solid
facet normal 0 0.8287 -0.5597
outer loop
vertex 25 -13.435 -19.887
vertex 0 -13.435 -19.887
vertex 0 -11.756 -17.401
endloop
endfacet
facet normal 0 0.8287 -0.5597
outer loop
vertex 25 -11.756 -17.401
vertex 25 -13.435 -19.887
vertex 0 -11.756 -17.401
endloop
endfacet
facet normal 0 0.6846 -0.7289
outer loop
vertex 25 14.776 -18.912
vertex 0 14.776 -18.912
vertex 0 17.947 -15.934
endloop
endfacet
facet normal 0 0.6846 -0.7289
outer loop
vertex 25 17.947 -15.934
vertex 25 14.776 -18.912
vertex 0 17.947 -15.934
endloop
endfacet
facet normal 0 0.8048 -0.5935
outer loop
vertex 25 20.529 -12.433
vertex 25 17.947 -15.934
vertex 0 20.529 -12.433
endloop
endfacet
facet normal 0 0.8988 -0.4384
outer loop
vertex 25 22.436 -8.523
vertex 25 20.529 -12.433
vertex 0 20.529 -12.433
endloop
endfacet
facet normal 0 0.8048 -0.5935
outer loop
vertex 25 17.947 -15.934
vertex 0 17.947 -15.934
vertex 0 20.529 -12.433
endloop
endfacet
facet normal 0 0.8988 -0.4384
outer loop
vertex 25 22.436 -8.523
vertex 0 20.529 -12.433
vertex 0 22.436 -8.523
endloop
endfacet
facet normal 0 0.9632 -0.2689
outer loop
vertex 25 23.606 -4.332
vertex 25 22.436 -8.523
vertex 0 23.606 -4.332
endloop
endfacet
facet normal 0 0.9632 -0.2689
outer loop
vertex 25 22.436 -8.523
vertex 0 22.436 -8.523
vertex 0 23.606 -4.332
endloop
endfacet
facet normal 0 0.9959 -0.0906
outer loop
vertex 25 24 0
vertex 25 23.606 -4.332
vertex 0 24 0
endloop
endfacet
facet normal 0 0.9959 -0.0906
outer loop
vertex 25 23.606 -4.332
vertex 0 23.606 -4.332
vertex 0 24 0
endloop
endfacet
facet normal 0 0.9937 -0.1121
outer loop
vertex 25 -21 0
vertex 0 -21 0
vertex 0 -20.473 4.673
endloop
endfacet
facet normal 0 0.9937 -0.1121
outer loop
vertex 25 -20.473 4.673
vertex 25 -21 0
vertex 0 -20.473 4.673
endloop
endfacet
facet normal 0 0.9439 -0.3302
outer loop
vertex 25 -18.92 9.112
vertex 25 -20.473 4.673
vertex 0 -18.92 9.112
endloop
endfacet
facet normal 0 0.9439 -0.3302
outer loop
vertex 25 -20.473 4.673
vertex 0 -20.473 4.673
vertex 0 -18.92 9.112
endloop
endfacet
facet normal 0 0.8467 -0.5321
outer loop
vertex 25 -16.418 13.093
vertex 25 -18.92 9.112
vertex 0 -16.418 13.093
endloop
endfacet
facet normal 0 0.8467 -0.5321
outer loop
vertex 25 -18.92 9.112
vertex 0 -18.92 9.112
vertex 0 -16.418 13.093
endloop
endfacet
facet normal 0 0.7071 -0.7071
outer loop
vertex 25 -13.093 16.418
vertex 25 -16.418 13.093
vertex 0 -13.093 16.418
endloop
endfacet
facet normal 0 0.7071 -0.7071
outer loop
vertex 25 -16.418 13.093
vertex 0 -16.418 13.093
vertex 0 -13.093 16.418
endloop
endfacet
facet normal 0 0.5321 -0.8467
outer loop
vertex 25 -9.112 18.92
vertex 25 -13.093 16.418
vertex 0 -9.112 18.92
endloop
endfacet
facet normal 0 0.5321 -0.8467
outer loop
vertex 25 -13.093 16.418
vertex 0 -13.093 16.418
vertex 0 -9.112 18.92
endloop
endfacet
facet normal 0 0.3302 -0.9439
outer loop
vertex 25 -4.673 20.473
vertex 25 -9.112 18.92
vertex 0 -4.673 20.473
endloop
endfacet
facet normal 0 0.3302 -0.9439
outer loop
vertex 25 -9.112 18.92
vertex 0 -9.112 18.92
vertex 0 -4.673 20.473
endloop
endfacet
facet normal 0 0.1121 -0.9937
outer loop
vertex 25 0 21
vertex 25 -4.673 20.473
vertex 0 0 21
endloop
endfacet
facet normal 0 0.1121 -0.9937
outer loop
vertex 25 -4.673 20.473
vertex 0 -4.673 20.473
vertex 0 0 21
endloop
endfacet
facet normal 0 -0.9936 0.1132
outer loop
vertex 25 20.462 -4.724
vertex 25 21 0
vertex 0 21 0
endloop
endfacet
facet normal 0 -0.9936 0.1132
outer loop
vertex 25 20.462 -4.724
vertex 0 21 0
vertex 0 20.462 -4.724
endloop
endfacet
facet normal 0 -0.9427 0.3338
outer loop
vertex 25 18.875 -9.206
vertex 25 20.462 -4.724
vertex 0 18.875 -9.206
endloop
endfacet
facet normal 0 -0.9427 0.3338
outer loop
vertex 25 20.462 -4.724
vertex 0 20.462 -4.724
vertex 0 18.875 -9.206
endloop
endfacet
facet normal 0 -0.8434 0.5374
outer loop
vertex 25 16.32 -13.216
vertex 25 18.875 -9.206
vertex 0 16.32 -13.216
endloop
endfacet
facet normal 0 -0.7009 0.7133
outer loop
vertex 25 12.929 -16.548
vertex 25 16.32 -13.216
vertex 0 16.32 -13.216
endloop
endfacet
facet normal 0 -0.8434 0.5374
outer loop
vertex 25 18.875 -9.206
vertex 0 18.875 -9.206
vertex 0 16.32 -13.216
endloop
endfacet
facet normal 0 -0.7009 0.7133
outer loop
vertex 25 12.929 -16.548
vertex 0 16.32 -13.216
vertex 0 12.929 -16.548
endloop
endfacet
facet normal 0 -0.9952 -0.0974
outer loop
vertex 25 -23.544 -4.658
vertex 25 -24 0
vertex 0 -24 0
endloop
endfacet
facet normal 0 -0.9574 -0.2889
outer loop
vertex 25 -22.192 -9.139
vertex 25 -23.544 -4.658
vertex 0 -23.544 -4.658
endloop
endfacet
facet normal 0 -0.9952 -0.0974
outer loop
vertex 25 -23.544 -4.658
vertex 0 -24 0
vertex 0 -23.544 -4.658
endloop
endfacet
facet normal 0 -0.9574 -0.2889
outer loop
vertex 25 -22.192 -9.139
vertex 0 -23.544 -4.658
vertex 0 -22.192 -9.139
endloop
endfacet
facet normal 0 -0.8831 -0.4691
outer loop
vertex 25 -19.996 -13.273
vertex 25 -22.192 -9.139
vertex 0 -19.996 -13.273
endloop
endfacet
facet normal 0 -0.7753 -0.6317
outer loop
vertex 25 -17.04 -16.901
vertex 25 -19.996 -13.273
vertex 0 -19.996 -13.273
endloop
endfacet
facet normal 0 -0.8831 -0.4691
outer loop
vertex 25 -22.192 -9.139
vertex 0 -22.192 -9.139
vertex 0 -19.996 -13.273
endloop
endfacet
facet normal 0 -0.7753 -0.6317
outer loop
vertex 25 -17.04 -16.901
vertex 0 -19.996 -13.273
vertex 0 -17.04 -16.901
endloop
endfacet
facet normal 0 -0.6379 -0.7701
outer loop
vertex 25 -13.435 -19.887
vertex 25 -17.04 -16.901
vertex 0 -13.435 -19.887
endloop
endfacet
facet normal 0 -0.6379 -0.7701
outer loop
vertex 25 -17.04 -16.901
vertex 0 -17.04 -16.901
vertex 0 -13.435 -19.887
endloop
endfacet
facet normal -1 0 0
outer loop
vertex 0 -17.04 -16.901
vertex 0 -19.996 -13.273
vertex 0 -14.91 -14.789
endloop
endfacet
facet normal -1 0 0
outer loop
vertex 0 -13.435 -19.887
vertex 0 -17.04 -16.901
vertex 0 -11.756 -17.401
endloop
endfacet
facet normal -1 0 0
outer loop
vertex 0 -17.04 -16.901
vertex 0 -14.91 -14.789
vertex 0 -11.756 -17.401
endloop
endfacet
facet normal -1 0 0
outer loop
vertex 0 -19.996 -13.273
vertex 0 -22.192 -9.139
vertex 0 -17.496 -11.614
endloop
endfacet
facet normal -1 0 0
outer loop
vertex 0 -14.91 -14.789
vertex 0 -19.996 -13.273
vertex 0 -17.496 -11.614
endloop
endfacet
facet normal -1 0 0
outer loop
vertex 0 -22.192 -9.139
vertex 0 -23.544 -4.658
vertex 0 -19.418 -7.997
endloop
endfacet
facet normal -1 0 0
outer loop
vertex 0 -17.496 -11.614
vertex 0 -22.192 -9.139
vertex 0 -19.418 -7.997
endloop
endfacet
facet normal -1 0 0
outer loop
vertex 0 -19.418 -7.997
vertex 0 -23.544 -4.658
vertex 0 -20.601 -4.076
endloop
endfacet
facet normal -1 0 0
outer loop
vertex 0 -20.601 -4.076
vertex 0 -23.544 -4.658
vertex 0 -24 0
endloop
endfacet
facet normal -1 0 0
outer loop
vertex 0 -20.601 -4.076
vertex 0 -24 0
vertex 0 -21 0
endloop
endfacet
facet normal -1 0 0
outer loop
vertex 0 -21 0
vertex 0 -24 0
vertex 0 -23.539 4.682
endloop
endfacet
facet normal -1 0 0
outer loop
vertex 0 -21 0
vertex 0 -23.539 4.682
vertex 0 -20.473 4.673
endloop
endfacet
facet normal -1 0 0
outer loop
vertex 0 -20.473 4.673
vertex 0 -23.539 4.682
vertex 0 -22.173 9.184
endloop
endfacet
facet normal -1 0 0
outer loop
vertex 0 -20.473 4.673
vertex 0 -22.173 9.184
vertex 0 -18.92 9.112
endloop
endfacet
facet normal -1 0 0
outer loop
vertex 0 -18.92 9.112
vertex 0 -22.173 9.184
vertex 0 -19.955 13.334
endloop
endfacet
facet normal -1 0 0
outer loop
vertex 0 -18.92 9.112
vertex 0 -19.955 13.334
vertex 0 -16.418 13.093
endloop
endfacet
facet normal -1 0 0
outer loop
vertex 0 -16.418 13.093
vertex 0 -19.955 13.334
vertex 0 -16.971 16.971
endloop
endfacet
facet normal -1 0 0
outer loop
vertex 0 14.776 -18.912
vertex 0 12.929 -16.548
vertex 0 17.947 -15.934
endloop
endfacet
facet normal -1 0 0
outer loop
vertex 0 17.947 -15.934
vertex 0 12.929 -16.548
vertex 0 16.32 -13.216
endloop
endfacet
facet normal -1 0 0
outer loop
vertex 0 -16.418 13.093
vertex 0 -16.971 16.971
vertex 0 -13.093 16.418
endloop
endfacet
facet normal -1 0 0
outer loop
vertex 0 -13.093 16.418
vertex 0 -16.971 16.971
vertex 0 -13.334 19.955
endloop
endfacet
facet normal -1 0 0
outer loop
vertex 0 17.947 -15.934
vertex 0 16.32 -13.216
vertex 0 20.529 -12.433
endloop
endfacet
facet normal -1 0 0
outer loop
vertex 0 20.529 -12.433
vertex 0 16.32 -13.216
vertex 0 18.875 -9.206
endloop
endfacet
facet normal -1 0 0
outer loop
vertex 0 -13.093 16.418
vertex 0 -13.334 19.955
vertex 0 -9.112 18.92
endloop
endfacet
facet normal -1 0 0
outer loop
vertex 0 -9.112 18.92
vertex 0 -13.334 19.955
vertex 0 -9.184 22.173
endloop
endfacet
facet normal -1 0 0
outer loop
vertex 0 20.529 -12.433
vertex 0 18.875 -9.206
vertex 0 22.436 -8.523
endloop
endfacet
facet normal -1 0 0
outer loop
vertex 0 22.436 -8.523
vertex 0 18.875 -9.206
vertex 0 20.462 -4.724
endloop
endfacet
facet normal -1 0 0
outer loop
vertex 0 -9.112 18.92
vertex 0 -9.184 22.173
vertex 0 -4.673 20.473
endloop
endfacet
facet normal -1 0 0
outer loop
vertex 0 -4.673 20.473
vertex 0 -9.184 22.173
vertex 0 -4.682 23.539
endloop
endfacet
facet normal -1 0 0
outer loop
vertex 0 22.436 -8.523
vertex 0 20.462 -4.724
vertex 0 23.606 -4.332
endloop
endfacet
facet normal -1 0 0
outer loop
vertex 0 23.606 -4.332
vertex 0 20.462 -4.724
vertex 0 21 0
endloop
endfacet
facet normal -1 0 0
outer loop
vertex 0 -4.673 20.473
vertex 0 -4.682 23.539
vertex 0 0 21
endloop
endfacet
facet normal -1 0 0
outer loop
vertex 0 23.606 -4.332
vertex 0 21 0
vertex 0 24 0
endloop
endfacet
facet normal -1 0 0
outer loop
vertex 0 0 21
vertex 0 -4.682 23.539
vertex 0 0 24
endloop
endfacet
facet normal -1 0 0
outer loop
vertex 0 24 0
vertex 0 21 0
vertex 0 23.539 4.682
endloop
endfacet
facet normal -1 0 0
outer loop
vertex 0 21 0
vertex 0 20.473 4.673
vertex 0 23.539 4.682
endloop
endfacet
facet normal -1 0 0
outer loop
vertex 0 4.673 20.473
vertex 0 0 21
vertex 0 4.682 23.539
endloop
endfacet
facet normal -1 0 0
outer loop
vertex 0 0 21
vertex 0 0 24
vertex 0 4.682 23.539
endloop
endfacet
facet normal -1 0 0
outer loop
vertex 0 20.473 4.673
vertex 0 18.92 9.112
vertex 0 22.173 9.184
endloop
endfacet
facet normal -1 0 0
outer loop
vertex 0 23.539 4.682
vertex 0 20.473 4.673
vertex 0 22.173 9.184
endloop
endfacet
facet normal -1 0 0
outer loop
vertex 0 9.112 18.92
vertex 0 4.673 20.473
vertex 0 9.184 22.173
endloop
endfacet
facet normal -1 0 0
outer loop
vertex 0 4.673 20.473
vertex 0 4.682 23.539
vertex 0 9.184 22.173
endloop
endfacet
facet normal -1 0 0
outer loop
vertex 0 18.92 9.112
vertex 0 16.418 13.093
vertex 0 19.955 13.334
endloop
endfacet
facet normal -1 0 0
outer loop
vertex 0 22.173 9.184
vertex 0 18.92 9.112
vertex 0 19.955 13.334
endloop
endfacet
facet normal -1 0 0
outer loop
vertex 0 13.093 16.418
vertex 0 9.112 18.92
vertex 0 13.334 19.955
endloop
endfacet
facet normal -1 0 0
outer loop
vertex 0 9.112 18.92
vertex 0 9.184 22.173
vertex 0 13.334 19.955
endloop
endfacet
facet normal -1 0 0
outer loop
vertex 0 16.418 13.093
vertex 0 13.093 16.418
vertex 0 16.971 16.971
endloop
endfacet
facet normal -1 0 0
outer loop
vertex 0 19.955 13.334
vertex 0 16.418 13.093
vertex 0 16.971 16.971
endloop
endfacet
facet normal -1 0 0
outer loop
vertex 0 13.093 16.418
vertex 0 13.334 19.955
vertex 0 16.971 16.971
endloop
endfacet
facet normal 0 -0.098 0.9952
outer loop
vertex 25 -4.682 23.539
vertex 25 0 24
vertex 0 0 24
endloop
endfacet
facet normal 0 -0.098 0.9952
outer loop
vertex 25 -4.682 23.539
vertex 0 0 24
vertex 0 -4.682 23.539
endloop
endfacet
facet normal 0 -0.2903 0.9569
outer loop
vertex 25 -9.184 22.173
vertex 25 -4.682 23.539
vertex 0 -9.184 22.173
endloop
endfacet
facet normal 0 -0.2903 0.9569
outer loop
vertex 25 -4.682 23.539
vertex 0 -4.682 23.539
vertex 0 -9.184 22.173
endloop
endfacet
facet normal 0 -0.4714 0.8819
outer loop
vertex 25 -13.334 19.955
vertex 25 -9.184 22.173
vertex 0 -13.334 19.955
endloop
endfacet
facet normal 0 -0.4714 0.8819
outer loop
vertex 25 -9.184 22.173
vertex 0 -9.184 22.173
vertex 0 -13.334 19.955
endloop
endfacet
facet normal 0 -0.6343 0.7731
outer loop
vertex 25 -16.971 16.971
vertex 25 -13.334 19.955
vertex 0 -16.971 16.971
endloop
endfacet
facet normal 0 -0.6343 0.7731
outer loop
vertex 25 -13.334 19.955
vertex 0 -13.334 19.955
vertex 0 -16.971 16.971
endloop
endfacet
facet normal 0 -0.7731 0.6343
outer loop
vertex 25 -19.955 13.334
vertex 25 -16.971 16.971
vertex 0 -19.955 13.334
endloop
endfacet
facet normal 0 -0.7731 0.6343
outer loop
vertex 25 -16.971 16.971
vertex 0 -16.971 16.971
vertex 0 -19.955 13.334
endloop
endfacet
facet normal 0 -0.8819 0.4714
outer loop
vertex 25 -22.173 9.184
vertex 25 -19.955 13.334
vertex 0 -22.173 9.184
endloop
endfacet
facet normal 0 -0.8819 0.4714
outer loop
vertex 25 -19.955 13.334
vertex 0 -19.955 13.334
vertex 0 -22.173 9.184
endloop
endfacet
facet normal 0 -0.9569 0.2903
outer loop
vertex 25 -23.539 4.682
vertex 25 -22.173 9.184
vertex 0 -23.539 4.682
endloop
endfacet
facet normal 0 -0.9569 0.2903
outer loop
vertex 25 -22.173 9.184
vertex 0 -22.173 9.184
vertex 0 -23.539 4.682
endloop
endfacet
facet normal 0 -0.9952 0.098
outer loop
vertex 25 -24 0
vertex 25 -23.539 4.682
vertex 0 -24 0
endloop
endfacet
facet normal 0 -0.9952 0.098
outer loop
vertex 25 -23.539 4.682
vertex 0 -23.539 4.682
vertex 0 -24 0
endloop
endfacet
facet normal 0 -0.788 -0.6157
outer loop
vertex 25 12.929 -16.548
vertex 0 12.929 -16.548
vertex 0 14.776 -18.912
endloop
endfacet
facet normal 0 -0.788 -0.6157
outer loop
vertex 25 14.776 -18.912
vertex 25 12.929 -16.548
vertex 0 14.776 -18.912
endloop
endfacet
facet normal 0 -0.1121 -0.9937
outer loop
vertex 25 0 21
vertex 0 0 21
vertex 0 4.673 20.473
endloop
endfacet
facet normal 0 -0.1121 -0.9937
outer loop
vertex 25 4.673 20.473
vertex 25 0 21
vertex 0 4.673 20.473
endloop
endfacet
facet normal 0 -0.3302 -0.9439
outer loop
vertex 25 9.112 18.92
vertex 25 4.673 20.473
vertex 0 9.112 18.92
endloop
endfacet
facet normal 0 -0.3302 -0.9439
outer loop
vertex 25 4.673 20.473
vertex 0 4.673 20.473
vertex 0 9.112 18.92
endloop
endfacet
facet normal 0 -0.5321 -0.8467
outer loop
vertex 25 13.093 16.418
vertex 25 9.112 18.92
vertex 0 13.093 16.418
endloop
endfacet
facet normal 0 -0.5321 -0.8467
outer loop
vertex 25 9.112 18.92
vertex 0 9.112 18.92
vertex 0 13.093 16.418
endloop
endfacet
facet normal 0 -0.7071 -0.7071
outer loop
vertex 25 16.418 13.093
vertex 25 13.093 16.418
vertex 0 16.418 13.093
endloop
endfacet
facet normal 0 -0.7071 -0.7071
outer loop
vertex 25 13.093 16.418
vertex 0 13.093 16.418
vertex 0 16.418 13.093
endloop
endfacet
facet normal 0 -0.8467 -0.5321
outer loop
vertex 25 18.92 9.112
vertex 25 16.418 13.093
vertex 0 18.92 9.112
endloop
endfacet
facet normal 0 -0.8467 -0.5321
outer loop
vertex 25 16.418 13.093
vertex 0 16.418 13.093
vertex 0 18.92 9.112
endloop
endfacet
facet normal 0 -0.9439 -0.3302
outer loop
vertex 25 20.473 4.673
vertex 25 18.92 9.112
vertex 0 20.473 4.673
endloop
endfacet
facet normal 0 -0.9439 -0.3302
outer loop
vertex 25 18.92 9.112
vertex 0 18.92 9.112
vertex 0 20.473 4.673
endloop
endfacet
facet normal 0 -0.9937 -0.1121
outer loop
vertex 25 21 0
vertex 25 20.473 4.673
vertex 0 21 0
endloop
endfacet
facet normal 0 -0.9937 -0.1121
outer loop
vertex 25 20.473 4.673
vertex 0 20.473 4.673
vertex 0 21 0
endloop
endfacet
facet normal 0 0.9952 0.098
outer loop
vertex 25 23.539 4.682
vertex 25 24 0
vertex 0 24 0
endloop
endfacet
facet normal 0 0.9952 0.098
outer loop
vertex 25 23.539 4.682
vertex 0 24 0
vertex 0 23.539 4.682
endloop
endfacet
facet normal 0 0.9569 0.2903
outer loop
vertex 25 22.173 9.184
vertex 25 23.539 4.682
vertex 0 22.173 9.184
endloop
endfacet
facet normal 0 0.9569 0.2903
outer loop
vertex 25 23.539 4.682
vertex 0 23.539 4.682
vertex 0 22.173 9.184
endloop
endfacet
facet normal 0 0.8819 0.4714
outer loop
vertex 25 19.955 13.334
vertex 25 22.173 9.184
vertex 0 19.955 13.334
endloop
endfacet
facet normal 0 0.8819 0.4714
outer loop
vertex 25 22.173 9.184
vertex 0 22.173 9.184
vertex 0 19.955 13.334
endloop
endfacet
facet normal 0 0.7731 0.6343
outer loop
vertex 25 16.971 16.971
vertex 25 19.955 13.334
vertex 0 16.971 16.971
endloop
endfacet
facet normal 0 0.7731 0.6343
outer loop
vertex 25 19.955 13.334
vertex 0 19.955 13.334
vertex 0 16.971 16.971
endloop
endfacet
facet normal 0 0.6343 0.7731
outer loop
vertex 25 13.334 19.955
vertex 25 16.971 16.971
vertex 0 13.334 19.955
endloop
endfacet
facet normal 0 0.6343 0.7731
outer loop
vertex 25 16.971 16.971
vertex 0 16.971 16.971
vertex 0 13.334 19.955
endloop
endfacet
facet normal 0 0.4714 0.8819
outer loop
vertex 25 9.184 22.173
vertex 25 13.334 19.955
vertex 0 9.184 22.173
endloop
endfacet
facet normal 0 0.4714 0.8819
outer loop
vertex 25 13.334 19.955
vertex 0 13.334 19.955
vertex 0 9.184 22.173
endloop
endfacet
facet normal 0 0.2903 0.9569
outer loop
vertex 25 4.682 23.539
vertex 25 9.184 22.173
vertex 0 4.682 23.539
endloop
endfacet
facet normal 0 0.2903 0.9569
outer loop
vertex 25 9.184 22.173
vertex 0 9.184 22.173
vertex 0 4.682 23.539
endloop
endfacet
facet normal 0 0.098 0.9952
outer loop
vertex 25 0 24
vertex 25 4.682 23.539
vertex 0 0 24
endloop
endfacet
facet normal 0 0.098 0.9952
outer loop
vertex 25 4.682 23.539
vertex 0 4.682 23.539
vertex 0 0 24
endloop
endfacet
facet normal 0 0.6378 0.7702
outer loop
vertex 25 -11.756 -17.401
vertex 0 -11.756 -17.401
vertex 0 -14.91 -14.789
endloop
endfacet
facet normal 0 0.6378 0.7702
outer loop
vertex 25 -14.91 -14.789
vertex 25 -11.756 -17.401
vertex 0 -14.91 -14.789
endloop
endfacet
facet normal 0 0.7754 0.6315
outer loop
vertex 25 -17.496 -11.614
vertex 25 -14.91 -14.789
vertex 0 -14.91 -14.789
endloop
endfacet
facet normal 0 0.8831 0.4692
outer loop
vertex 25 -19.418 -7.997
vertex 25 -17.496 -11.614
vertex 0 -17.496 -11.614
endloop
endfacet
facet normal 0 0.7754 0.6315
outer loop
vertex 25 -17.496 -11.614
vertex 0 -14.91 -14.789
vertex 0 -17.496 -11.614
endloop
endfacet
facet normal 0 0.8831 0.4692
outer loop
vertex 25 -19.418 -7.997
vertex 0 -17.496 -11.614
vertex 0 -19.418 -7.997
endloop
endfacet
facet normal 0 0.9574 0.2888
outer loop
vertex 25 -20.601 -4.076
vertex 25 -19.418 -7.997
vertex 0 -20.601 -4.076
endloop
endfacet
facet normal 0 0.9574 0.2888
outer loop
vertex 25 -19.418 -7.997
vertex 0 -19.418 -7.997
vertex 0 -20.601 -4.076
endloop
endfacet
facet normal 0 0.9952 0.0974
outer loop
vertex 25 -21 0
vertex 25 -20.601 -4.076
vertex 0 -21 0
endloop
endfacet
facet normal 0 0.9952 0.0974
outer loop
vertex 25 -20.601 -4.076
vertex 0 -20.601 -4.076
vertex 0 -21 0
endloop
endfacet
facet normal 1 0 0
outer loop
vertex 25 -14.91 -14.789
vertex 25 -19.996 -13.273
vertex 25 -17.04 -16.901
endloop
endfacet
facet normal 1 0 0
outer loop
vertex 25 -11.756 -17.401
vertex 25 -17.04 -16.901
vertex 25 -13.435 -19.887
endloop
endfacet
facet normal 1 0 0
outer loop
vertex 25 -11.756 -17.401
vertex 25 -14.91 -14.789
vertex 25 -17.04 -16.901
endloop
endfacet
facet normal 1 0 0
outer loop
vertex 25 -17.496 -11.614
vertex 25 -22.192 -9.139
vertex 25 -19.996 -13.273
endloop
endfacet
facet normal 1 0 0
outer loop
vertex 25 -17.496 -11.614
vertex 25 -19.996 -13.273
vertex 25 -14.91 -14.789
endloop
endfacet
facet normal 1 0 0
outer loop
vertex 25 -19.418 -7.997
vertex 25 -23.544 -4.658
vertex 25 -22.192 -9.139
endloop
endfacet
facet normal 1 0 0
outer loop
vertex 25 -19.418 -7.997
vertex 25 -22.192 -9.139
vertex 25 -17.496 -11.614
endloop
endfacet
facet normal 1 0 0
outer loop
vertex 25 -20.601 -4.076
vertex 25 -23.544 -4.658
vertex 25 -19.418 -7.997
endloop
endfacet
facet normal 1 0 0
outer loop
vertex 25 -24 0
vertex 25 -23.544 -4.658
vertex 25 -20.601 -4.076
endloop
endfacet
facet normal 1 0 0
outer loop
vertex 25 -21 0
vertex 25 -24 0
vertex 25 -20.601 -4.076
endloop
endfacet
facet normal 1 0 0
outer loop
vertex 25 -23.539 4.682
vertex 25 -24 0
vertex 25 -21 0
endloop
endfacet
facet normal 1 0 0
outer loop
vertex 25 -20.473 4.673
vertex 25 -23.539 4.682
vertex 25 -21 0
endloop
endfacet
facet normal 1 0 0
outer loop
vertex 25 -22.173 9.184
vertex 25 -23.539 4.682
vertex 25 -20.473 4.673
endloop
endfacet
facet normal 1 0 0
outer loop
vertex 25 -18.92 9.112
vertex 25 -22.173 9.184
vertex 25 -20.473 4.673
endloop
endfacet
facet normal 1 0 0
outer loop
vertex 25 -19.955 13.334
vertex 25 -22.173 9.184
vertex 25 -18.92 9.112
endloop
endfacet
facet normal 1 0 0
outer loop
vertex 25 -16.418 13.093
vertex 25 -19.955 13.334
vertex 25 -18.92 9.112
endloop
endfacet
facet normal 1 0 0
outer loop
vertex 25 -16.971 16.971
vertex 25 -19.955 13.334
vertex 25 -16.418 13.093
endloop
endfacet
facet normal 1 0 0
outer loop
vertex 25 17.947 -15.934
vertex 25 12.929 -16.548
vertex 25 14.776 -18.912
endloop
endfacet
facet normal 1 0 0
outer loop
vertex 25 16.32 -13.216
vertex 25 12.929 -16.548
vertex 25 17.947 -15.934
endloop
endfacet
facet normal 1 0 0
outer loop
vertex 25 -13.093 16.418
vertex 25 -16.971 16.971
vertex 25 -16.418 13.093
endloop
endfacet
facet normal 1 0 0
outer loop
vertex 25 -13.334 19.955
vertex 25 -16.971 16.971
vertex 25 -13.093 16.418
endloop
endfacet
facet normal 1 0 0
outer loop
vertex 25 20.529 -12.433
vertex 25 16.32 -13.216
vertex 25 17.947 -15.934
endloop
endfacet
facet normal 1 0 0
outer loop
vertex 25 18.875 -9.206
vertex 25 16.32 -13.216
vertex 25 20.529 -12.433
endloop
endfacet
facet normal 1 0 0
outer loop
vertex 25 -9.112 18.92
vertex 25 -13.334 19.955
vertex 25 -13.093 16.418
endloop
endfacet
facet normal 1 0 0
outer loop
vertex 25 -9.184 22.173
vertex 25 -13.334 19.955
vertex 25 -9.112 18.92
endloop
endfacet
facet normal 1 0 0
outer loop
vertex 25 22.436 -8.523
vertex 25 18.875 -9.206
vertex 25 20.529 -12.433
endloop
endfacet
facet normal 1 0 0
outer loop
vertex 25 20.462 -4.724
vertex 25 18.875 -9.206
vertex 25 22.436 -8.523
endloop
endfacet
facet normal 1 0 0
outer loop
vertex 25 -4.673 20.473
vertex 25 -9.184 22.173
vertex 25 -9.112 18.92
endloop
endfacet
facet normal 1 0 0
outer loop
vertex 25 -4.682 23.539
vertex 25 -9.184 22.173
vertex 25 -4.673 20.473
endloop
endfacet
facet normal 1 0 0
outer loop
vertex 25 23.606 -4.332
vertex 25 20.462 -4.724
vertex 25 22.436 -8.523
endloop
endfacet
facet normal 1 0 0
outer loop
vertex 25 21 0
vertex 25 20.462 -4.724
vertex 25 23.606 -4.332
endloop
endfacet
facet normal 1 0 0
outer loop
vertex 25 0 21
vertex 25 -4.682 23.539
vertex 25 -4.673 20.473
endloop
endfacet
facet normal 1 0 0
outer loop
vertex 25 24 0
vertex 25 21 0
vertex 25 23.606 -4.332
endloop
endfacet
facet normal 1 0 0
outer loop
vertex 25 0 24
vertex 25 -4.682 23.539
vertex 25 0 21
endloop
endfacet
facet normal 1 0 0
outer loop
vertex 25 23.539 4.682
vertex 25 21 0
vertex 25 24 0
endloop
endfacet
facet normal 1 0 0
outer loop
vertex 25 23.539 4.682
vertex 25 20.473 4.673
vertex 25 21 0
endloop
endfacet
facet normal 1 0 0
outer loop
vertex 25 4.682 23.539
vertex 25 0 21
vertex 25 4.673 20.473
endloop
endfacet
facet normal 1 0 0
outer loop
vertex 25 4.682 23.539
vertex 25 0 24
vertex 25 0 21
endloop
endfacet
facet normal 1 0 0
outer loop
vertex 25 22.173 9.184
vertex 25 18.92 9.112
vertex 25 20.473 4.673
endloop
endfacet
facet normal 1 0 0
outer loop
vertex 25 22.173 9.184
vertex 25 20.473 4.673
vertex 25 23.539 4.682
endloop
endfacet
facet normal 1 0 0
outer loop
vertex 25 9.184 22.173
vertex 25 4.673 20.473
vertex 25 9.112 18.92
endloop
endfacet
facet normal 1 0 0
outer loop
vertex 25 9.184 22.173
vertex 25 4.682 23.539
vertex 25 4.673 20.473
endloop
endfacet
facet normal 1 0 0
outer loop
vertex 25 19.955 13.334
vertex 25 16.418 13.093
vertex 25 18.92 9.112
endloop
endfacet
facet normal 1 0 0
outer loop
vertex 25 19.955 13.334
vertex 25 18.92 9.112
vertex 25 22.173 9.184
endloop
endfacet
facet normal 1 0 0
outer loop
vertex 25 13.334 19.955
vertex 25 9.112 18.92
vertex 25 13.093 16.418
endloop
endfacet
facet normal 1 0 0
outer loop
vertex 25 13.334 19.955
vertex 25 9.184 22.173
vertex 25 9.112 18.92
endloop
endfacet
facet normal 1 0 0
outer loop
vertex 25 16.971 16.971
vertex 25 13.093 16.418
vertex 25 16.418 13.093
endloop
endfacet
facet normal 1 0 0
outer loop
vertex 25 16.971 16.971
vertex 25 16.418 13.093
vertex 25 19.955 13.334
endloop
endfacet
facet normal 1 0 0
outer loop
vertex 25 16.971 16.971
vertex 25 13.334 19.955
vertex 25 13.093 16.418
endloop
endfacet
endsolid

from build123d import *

# Parameters (mm, degrees)
F1_DEPTH = 25


with BuildPart() as f1:
    # F0 (on Right) → F1 (new body)
    with BuildSketch(Plane.YZ):
        with BuildLine():
            Line((0, 21), (0, 24))
            ThreePointArc((0, 24), (-16.970563, 16.970563), (-24, 0))
            Line((-24, 0), (-21, 0))
            ThreePointArc((-21, 0), (-14.849242, 14.849242), (0, 21))
        make_face()
        with BuildLine():
            Line((-21, 0), (-24, 0))
            ThreePointArc((-24, 0), (-21.194852, -11.259585), (-13.435146, -19.887103))
            Line((-13.435146, -19.887103), (-11.755753, -17.401215))
            ThreePointArc((-11.755753, -17.401215), (-18.545496, -9.852137), (-21, 0))
        make_face()
        with BuildLine():
            Line((21, 0), (24, 0))
            ThreePointArc((24, 0), (16.970563, 16.970563), (0, 24))
            Line((0, 24), (0, 21))
            ThreePointArc((0, 21), (14.849242, 14.849242), (21, 0))
        make_face()
        with BuildLine():
            Line((12.928941, -16.548187), (14.775932, -18.912213))
            ThreePointArc((14.775932, -18.912213), (21.571073, -10.520875), (24, 0))
            Line((24, 0), (21, 0))
            ThreePointArc((21, 0), (18.874689, -9.205766), (12.928941, -16.548187))
        make_face()
    extrude(amount=F1_DEPTH)


solid = f1.part
